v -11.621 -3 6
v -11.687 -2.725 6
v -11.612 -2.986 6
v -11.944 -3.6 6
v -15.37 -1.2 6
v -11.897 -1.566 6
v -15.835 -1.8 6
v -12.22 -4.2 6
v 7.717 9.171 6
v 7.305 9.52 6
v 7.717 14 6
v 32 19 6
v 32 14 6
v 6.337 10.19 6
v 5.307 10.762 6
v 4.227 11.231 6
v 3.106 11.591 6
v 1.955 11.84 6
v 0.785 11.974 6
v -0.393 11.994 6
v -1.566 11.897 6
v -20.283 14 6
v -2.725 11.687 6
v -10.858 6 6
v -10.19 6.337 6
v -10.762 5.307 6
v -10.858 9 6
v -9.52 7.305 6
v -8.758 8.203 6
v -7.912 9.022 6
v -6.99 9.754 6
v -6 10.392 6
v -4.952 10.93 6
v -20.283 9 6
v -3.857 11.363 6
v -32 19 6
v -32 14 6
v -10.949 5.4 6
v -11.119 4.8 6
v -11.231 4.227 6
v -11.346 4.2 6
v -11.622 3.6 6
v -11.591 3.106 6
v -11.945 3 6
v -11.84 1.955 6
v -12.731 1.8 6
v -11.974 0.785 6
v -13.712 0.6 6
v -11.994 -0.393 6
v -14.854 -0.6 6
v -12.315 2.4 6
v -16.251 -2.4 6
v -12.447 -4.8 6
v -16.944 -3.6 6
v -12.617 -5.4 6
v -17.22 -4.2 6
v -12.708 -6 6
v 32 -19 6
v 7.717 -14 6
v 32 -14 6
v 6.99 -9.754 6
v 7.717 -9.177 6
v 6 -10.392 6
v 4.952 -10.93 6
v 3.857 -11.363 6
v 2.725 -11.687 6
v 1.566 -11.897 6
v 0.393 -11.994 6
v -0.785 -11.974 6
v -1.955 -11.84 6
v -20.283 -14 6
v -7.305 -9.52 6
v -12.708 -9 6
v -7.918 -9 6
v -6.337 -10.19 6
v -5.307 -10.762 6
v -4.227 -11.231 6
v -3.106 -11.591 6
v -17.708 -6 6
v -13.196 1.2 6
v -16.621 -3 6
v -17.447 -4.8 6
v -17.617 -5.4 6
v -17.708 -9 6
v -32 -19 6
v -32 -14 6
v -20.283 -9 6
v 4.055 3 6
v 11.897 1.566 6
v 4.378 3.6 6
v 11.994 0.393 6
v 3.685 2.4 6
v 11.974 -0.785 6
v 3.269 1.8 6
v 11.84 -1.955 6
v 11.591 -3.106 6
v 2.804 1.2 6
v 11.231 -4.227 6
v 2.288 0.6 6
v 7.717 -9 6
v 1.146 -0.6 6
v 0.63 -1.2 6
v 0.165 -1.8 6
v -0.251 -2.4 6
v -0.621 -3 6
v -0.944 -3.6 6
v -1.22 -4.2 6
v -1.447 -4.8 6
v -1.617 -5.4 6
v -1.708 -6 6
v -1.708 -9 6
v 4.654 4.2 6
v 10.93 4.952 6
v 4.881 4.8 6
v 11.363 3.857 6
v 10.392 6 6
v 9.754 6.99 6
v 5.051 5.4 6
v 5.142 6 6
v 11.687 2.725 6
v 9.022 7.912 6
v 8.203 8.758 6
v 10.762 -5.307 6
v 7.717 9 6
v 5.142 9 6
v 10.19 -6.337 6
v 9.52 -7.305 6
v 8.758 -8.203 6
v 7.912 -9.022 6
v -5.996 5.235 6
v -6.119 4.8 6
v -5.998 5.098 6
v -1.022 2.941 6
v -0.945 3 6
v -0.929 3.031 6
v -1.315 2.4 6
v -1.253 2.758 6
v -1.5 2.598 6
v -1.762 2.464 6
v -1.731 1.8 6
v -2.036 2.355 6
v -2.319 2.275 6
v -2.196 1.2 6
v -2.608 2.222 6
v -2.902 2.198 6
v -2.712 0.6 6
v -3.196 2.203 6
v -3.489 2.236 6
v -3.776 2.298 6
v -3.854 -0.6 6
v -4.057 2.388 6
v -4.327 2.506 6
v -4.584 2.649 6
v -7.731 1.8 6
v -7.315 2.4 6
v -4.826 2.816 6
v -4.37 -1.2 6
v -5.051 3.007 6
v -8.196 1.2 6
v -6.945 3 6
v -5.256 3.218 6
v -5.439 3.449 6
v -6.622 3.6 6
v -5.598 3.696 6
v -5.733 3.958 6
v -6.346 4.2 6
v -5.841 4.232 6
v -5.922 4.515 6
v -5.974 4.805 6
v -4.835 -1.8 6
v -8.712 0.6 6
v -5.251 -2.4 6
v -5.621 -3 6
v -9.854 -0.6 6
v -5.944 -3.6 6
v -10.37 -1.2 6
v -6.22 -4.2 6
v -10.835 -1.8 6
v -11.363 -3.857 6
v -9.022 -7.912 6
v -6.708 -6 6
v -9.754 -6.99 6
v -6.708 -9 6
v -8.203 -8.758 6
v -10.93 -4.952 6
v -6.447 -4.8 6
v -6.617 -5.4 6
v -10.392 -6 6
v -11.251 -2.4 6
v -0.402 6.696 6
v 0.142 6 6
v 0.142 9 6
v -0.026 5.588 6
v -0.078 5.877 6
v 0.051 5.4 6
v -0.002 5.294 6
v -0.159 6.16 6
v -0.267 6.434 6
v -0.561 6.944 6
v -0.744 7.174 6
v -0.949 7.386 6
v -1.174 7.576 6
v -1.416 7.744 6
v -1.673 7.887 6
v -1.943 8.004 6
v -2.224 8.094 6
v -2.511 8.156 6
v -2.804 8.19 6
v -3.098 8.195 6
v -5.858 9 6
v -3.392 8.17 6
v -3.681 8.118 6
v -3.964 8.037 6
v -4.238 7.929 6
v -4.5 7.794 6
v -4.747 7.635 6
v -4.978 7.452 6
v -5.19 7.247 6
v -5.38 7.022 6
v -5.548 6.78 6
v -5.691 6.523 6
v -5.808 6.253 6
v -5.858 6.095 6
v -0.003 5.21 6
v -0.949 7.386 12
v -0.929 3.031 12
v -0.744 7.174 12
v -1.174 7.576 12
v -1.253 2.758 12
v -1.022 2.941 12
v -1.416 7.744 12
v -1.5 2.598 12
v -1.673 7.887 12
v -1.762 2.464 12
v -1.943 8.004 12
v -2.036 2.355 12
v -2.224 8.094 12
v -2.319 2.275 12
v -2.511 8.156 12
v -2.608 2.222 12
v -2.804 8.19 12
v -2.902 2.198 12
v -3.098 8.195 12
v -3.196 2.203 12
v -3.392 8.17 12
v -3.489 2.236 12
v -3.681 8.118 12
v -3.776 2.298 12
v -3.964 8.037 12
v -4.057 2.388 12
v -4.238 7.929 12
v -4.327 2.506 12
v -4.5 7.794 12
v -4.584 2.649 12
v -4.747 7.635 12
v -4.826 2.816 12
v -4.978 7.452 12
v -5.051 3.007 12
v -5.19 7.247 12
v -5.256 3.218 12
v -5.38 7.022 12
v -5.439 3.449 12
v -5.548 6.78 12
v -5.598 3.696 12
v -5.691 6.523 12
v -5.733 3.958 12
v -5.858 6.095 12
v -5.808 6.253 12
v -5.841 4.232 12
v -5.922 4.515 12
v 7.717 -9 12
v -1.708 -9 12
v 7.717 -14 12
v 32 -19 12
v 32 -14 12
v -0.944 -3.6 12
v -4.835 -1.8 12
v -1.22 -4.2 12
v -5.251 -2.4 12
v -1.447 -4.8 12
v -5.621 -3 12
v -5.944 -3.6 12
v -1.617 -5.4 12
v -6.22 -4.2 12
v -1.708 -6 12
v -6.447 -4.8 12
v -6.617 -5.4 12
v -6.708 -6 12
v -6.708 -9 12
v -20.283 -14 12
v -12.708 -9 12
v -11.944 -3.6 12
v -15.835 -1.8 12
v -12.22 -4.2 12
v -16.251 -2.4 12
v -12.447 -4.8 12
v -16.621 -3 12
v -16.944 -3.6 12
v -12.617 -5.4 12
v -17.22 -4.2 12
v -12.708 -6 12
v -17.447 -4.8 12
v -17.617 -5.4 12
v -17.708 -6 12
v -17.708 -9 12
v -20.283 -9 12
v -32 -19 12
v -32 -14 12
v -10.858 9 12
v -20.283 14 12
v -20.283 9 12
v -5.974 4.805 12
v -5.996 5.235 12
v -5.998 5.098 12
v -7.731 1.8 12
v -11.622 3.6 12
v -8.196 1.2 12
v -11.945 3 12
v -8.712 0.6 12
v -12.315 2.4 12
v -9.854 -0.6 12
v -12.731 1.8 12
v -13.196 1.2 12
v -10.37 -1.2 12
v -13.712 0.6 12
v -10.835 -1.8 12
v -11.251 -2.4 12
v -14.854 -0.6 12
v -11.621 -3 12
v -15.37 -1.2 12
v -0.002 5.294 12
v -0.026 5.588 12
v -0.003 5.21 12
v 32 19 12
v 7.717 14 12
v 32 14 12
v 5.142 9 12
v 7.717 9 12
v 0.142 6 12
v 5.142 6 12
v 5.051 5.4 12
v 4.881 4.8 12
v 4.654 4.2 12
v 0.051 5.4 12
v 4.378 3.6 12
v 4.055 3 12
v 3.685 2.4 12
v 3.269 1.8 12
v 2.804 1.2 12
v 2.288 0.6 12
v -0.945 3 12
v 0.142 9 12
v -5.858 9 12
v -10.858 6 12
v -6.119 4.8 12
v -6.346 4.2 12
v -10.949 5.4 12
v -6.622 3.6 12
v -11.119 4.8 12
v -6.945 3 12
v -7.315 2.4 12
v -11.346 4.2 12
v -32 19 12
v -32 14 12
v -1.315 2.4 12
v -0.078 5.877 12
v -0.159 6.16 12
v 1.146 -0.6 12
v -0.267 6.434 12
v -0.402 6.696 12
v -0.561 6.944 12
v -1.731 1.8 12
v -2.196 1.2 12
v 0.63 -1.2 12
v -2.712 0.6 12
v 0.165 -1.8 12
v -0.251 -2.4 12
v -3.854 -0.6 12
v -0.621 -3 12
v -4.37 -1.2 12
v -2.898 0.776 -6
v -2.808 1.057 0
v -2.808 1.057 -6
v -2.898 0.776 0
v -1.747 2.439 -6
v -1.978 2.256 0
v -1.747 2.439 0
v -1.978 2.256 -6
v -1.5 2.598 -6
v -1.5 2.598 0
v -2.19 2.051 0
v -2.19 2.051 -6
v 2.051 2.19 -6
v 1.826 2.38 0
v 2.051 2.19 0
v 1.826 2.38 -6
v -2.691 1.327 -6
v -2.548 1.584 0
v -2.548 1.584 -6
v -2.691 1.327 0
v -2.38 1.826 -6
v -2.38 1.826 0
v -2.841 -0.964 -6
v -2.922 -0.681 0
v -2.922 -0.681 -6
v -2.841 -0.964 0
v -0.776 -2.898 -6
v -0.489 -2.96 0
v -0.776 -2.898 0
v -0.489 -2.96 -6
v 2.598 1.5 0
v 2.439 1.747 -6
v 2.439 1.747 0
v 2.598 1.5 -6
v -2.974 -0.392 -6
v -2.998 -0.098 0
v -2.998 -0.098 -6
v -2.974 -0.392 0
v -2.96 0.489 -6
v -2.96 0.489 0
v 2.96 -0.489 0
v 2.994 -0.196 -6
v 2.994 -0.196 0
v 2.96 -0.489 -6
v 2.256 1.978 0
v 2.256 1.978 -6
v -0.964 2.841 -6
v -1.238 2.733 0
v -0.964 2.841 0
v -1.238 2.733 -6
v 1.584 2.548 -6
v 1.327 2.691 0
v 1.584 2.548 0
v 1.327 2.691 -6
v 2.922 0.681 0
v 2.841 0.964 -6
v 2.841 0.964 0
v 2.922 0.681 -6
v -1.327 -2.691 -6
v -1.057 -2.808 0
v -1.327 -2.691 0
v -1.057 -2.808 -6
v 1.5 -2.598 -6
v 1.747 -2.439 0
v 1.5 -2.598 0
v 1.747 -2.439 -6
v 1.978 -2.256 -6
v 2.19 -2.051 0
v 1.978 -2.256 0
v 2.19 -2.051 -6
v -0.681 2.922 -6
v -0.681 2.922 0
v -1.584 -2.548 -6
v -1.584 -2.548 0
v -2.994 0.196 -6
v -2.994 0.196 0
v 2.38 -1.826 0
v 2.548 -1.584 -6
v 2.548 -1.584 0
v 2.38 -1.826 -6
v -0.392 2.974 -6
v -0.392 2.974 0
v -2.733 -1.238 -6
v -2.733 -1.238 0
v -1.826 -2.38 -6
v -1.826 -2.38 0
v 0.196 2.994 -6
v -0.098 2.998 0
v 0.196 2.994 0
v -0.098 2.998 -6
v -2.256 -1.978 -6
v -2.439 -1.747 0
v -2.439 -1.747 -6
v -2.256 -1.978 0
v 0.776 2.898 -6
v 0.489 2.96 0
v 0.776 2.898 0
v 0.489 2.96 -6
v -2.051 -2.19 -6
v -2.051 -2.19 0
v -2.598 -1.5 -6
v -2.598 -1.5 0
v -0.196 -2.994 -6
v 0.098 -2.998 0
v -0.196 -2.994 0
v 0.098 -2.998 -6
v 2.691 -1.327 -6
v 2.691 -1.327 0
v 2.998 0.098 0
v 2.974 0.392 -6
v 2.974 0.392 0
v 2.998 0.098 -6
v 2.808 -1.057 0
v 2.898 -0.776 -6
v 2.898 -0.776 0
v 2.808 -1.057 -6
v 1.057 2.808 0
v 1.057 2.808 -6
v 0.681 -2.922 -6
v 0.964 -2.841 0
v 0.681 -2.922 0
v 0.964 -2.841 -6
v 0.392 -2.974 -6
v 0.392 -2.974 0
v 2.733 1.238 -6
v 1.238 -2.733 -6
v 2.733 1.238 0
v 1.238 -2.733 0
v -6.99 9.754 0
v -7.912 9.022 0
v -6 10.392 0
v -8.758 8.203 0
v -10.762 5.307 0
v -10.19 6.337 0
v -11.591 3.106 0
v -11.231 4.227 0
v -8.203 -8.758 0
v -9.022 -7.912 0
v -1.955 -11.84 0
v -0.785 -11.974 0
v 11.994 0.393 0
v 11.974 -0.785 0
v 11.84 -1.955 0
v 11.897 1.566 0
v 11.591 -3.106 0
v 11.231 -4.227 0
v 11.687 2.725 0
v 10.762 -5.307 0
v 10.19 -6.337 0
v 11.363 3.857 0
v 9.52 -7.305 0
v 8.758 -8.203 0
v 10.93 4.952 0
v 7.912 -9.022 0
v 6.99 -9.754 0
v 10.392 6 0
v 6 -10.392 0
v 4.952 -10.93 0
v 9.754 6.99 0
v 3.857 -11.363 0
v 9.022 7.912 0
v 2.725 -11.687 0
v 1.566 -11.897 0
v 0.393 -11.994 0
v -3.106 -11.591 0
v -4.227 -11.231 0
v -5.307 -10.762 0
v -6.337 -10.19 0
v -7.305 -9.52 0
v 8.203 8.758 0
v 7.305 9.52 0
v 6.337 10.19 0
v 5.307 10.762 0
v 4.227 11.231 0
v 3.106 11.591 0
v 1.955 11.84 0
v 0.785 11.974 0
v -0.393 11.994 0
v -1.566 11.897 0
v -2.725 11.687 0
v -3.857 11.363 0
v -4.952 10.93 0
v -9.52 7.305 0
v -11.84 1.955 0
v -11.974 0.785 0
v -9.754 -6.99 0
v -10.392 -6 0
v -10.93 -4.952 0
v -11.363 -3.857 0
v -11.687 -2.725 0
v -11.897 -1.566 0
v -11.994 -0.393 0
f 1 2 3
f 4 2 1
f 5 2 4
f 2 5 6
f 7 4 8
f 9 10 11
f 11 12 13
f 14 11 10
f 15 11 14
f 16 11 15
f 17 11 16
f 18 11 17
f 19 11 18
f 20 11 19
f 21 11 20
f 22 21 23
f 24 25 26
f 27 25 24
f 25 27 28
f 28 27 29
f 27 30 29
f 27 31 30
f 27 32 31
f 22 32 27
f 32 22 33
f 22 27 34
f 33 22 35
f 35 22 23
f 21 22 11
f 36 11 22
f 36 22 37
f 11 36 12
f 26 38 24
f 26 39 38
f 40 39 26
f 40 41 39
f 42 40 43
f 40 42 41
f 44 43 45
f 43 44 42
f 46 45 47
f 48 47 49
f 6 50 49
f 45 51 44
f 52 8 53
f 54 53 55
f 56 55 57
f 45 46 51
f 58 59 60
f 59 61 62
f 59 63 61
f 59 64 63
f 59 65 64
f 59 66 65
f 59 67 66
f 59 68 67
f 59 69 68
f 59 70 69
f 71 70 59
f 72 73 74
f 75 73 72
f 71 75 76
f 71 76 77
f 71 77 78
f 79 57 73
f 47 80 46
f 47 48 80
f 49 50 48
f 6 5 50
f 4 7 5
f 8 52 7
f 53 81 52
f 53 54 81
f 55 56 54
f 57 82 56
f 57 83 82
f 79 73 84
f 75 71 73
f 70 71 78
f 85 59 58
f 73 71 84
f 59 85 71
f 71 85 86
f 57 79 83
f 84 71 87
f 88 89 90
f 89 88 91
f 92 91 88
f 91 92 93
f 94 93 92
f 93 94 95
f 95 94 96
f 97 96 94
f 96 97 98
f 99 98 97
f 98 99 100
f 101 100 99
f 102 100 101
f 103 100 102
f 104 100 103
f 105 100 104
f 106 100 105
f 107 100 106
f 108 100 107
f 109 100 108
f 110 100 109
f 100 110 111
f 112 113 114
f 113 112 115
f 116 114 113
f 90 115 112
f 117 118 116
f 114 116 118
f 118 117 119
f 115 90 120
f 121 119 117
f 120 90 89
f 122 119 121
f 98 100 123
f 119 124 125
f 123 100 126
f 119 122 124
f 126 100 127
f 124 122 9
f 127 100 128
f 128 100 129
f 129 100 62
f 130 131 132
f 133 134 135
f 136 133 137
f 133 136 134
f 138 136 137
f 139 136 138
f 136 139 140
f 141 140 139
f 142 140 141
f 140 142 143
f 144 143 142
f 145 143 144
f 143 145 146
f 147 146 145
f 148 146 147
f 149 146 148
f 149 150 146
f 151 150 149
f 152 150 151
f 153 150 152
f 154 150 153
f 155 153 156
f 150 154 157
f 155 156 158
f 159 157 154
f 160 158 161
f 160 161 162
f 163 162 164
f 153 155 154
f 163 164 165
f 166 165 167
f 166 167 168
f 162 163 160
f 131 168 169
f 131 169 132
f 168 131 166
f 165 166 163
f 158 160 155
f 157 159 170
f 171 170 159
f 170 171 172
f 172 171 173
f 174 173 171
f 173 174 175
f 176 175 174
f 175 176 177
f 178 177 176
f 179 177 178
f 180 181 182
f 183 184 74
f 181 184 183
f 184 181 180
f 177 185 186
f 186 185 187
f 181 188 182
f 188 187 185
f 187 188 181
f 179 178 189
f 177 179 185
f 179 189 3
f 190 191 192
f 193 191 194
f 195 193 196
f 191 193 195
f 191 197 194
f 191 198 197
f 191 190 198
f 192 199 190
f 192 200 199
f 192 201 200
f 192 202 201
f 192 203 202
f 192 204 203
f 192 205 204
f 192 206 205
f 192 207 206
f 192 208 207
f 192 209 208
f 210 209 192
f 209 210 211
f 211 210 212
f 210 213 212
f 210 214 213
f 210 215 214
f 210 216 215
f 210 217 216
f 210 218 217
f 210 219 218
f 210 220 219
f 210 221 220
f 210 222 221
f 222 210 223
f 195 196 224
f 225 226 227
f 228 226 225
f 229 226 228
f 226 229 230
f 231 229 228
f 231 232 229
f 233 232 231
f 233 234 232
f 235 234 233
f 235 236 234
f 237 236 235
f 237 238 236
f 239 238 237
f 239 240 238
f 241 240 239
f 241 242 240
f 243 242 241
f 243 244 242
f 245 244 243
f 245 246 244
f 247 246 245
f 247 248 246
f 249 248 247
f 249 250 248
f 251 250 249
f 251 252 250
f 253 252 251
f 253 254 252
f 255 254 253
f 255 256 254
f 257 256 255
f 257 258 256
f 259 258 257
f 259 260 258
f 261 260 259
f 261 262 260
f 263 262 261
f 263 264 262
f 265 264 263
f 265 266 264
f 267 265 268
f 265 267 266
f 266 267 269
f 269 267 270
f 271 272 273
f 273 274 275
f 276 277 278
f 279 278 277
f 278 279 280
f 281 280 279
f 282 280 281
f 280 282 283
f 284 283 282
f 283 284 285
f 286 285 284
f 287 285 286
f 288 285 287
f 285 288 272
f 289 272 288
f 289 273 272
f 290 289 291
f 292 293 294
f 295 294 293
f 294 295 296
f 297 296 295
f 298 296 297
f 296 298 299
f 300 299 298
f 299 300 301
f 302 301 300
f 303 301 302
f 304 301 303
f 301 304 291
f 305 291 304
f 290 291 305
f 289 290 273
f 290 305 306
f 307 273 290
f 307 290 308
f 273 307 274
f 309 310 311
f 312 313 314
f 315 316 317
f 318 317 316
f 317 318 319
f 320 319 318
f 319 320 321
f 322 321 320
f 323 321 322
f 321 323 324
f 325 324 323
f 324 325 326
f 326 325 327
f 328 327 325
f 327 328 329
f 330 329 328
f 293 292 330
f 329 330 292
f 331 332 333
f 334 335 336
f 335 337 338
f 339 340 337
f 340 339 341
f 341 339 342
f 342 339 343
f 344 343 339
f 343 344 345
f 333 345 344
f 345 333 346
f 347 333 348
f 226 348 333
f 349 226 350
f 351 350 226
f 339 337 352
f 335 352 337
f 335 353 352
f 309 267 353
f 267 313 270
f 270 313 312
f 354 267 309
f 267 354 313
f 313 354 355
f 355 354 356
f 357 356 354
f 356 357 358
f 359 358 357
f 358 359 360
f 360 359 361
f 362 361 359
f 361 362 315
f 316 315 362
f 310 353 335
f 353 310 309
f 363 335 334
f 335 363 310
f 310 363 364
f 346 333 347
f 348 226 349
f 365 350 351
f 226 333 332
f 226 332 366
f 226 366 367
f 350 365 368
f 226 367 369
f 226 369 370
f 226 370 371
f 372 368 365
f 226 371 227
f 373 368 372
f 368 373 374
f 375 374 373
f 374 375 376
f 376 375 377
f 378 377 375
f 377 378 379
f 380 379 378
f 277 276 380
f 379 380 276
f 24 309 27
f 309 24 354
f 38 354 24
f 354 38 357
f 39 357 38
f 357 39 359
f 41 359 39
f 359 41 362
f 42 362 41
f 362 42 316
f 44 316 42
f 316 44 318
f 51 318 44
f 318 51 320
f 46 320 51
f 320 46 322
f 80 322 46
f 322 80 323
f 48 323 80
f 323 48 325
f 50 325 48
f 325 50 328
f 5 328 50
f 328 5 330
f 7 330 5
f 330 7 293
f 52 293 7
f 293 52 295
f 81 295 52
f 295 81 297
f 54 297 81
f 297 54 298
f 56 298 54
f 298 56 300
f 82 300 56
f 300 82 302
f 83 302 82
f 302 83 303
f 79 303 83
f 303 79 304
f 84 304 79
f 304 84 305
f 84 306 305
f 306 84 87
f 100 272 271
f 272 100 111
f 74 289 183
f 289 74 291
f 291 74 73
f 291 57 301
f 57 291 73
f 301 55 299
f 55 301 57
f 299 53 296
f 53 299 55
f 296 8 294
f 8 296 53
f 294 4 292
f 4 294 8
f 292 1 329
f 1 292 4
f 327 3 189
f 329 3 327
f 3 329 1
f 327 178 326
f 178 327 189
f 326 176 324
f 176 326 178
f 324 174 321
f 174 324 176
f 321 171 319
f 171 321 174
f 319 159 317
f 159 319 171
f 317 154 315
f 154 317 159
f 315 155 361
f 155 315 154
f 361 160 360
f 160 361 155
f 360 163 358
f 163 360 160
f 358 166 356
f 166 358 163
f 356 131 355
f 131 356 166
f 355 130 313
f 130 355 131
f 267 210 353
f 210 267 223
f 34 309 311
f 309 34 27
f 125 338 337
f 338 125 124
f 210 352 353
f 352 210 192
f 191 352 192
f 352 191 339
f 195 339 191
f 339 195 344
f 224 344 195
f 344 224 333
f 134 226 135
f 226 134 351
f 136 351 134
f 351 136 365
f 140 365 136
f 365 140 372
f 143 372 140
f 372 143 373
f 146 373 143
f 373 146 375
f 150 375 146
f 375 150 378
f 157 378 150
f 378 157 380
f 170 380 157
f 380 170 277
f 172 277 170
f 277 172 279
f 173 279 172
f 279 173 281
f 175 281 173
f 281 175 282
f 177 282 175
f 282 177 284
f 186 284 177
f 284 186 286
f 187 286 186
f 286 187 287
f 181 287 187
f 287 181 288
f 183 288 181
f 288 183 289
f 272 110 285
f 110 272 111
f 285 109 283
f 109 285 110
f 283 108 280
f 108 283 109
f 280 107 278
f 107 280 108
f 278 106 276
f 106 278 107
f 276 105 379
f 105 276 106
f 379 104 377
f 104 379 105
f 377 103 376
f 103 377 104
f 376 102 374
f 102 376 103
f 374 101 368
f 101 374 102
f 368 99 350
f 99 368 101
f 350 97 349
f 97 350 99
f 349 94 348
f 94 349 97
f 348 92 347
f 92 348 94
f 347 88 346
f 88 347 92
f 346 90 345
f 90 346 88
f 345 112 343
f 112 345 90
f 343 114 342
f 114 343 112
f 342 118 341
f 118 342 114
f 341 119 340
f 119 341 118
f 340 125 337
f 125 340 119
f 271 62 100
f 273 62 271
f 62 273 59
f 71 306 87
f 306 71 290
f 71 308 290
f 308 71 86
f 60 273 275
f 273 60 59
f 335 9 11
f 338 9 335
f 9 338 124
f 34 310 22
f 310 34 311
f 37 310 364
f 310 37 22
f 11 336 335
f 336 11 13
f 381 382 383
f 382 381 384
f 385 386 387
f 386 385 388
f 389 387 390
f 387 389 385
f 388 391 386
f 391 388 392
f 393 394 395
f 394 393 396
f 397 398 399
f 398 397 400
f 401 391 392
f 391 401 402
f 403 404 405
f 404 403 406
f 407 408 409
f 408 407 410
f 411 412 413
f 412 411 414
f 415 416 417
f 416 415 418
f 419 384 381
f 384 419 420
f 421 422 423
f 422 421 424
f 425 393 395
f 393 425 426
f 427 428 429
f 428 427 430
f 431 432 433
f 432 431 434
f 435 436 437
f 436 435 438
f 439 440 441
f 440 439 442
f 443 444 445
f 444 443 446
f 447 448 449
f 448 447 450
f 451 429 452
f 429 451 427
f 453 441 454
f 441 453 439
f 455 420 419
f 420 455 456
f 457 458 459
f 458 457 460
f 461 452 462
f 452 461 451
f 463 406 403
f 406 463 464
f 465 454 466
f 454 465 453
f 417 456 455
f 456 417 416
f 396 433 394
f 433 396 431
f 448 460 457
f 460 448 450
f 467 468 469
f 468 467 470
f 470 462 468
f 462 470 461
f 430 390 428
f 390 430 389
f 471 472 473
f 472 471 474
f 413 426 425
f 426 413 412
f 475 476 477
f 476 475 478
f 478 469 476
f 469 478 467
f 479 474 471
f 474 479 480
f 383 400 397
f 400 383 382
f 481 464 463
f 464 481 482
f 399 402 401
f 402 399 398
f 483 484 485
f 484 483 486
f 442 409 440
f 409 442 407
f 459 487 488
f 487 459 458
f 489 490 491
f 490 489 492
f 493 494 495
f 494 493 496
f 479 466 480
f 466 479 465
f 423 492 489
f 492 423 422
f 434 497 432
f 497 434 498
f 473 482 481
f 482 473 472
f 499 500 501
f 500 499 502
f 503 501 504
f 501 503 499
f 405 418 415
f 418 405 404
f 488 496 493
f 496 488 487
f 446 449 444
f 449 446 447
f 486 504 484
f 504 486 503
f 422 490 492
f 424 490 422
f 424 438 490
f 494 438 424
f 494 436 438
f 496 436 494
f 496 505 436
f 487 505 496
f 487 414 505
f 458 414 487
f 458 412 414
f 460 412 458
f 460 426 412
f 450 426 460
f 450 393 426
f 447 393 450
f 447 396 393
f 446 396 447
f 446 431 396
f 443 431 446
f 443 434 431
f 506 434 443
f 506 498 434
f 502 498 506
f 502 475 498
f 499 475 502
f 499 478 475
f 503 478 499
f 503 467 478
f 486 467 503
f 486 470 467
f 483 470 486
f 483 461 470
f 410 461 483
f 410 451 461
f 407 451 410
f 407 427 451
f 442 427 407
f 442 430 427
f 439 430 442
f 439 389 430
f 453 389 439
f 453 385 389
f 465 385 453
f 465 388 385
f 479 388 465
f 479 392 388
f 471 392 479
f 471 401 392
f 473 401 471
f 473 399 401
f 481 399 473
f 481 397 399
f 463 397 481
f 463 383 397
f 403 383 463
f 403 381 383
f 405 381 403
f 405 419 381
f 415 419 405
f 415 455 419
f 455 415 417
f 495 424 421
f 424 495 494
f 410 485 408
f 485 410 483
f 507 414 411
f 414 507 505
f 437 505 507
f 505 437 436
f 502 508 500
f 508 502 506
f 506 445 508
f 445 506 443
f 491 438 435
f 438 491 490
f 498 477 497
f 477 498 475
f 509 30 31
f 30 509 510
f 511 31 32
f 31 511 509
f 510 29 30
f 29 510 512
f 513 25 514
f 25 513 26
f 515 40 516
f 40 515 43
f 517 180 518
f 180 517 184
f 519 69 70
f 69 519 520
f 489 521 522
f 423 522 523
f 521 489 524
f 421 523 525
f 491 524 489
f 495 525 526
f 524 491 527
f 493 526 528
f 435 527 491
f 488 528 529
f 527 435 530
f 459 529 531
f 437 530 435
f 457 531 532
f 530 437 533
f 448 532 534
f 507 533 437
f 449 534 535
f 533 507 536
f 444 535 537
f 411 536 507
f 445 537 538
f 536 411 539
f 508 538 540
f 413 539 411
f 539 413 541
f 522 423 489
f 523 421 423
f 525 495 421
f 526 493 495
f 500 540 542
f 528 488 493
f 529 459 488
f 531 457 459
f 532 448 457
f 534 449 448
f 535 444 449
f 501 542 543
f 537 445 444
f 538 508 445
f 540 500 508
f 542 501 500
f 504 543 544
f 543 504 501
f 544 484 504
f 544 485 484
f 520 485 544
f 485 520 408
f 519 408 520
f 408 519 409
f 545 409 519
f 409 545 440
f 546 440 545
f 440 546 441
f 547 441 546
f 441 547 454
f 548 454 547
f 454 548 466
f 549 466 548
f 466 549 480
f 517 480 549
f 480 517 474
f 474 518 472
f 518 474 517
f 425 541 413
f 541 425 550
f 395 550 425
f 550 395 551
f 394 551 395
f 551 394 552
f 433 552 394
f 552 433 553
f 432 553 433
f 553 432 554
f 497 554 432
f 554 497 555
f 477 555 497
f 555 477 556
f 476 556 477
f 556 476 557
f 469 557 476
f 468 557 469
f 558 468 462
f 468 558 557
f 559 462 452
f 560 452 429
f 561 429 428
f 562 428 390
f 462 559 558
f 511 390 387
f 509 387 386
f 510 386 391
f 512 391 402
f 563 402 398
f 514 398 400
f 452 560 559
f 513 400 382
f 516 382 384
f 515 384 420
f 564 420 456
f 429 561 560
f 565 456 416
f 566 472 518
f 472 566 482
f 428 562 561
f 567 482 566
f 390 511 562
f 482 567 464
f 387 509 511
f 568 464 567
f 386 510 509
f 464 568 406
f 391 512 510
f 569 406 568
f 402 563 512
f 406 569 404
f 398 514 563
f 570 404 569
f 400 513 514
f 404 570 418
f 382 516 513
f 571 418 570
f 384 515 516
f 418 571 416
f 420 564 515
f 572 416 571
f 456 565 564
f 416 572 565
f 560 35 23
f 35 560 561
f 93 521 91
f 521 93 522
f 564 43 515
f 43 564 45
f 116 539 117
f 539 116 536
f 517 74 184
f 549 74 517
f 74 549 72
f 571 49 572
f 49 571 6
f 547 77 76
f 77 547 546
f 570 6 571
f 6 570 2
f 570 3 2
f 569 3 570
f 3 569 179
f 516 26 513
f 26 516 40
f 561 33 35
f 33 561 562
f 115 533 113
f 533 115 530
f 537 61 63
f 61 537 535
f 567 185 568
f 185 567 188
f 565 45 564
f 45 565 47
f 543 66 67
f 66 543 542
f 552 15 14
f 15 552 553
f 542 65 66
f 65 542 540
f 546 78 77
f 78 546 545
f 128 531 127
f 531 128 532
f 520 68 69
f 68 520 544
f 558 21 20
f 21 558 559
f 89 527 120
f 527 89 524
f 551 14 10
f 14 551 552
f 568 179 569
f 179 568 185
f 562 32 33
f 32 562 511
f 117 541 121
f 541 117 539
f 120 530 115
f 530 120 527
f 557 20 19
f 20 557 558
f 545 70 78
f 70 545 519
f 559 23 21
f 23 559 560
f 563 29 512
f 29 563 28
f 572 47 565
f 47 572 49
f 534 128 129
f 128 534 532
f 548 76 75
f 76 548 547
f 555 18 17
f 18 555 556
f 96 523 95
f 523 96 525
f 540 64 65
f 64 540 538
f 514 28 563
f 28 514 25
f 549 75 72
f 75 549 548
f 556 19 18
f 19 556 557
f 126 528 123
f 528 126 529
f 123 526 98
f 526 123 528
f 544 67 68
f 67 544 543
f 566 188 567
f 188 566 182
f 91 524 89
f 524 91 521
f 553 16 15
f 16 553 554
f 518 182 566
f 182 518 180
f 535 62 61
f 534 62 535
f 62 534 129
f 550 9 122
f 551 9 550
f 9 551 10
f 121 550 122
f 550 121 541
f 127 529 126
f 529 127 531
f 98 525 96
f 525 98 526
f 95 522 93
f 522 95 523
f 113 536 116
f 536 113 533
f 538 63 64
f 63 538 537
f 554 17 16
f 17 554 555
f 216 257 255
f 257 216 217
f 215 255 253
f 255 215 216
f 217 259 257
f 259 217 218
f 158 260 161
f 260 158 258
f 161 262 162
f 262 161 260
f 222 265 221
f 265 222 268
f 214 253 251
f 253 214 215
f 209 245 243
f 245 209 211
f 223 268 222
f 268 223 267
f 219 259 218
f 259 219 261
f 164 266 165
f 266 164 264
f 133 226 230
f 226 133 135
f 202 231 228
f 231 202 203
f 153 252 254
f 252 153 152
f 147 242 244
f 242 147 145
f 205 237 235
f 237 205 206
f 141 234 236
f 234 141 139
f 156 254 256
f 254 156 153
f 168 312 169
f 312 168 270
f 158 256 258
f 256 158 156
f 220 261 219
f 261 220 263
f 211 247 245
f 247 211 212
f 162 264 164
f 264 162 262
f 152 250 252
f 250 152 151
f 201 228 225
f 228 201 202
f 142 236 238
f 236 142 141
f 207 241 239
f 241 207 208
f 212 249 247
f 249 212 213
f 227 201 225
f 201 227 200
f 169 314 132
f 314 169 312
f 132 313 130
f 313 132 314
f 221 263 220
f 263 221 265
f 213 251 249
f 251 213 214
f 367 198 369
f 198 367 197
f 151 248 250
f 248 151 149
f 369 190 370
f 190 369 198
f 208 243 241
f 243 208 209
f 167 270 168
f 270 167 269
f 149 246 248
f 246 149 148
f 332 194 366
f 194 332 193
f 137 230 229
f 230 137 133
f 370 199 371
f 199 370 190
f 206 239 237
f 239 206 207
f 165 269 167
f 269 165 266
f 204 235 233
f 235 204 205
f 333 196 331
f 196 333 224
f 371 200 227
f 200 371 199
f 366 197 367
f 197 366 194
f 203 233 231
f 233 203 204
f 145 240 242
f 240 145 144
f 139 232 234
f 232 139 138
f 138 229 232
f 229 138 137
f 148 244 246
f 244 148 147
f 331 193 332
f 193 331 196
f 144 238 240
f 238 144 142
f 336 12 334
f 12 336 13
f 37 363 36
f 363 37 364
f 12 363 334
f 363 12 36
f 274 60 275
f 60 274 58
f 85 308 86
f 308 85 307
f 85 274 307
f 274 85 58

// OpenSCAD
$time = 120;

h=6;
cr = 9;
mr = 6;
fw = 5;


module OF(){
rotate([0,0,90])
linear_extrude(h){
translate([0,3,0])    
polygon([ 
    each [ for (i = [-10 : 10]) let(x=0.1*i) [mr*x, mr*scline(x)] ],
    [mr+3,mr*scline(1)], [mr+3,mr*scline(1)+fw],
    each [ for (i = [-10 : 10]) let(x=-0.1*i) [mr*x, mr*scline(x)+fw] ],
    [-mr-3,mr*scline(-1)+fw], [-mr-3,mr*scline(-1)]
]);

translate([0,-3-fw,0])
polygon([ 
    each [ for (i = [-10 : 10]) let(x=0.1*i) [mr*x, mr*scline(x)] ],
    [mr+3,mr*scline(1)], [mr+3,mr*scline(1)+fw],
    each [ for (i = [-10 : 10]) let(x=-0.1*i) [mr*x, mr*scline(x)+fw] ],
    [-mr-3,mr*scline(-1)+fw], [-mr-3,mr*scline(-1)]
]);
}

    translate([-fw-cr,-mr-3-fw,0])cube([fw*2+cr*2,fw,h]);
    translate([-fw-cr,mr+3,0])cube([fw*2+cr*2,fw,h]);
}

function _scline(x) = (1 - asin( x )*PI/180 - sqrt(1-x*x));
function scline(x) = x > 0 ? _scline(x): -_scline(abs(x));

    
module OC(){
    translate([0,0,-h])cylinder(r=3,h=h*2,$fn=64);
    cylinder(r=mr+6,h=h,$fn=64);
    translate([mr,0,0])cylinder(r=3,h=h*2,$fn=64);
}



translate([-fw-(cr-mr)-mr*4,3+2*fw+1,h])cube([fw*2+cr*2+mr*6,fw,h]);
translate([-fw-(cr-mr)-mr*4,-3-3*fw-1,h])cube([fw*2+cr*2+mr*6,fw,h]);

translate([mr*scline(sin($time))+mr*cos($time),0,h])OF();
rotate([0,0,$time])OC();
